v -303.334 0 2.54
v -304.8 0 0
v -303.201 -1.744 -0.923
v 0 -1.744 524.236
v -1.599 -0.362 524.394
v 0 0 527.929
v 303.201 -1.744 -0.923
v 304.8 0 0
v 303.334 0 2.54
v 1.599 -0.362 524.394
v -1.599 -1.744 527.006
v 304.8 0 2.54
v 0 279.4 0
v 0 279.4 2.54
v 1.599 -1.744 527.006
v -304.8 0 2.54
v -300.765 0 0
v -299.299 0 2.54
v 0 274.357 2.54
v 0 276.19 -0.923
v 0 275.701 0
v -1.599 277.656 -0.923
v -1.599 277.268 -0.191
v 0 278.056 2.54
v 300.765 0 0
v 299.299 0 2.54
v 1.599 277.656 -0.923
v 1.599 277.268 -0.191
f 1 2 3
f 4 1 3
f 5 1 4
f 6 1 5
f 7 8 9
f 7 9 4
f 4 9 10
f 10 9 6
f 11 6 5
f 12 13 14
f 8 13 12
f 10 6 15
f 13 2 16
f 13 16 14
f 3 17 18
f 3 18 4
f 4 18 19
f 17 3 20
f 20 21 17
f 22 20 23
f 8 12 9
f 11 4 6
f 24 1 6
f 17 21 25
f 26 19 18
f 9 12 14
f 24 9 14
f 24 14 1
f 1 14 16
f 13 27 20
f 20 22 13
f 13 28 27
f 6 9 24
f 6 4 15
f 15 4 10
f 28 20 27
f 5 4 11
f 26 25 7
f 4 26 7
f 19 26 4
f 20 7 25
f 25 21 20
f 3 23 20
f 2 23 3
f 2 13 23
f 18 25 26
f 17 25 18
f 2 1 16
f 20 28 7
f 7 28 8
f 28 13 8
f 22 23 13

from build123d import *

# Parameters (mm, degrees)
BOSS_EXTRUDE1_DEPTH = 2.54
BOSS_EXTRUDE2_DEPTH = 2.54
BOSS_EXTRUDE3_DEPTH = 2.54


with BuildPart() as part:
    # Sketch6 → Boss-Extrude1 (new body)
    with BuildSketch(Plane(origin=(120.788646288, 131.769432314, 69.73735745), x_dir=(-0.7587184092087563, 0.44247091722357845, 0.47808562302066715), z_dir=(-0.6295142648161258, -0.6867428343448647, -0.3634502302502976))):
        Polygon((-231.257371127, -51.055743172), (252.395306061, -422.124803926), (123.626374272, 161.135037145), align=None)
    extrude(amount=BOSS_EXTRUDE1_DEPTH)

    # Sketch7 → Boss-Extrude2 (add)
    with BuildSketch(Plane(origin=(-120.788646288, 131.769432314, 69.73735745), x_dir=(-0.7587184092087562, -0.4424709172235786, -0.4780856230206672), z_dir=(0.629514264816126, -0.6867428343448646, -0.3634502302502976))):
        Polygon((231.257371127, -51.055743172), (-252.395306061, -422.124803926), (-123.626374272, 161.135037145), align=None)
    extrude(amount=BOSS_EXTRUDE2_DEPTH)

    # Sketch9 → Boss-Extrude3 (add)
    with BuildSketch(Plane.XY):
        Polygon((0, 279.4), (304.8, 0), (-304.8, 0), align=None)
    extrude(amount=BOSS_EXTRUDE3_DEPTH)


solid = part.part
